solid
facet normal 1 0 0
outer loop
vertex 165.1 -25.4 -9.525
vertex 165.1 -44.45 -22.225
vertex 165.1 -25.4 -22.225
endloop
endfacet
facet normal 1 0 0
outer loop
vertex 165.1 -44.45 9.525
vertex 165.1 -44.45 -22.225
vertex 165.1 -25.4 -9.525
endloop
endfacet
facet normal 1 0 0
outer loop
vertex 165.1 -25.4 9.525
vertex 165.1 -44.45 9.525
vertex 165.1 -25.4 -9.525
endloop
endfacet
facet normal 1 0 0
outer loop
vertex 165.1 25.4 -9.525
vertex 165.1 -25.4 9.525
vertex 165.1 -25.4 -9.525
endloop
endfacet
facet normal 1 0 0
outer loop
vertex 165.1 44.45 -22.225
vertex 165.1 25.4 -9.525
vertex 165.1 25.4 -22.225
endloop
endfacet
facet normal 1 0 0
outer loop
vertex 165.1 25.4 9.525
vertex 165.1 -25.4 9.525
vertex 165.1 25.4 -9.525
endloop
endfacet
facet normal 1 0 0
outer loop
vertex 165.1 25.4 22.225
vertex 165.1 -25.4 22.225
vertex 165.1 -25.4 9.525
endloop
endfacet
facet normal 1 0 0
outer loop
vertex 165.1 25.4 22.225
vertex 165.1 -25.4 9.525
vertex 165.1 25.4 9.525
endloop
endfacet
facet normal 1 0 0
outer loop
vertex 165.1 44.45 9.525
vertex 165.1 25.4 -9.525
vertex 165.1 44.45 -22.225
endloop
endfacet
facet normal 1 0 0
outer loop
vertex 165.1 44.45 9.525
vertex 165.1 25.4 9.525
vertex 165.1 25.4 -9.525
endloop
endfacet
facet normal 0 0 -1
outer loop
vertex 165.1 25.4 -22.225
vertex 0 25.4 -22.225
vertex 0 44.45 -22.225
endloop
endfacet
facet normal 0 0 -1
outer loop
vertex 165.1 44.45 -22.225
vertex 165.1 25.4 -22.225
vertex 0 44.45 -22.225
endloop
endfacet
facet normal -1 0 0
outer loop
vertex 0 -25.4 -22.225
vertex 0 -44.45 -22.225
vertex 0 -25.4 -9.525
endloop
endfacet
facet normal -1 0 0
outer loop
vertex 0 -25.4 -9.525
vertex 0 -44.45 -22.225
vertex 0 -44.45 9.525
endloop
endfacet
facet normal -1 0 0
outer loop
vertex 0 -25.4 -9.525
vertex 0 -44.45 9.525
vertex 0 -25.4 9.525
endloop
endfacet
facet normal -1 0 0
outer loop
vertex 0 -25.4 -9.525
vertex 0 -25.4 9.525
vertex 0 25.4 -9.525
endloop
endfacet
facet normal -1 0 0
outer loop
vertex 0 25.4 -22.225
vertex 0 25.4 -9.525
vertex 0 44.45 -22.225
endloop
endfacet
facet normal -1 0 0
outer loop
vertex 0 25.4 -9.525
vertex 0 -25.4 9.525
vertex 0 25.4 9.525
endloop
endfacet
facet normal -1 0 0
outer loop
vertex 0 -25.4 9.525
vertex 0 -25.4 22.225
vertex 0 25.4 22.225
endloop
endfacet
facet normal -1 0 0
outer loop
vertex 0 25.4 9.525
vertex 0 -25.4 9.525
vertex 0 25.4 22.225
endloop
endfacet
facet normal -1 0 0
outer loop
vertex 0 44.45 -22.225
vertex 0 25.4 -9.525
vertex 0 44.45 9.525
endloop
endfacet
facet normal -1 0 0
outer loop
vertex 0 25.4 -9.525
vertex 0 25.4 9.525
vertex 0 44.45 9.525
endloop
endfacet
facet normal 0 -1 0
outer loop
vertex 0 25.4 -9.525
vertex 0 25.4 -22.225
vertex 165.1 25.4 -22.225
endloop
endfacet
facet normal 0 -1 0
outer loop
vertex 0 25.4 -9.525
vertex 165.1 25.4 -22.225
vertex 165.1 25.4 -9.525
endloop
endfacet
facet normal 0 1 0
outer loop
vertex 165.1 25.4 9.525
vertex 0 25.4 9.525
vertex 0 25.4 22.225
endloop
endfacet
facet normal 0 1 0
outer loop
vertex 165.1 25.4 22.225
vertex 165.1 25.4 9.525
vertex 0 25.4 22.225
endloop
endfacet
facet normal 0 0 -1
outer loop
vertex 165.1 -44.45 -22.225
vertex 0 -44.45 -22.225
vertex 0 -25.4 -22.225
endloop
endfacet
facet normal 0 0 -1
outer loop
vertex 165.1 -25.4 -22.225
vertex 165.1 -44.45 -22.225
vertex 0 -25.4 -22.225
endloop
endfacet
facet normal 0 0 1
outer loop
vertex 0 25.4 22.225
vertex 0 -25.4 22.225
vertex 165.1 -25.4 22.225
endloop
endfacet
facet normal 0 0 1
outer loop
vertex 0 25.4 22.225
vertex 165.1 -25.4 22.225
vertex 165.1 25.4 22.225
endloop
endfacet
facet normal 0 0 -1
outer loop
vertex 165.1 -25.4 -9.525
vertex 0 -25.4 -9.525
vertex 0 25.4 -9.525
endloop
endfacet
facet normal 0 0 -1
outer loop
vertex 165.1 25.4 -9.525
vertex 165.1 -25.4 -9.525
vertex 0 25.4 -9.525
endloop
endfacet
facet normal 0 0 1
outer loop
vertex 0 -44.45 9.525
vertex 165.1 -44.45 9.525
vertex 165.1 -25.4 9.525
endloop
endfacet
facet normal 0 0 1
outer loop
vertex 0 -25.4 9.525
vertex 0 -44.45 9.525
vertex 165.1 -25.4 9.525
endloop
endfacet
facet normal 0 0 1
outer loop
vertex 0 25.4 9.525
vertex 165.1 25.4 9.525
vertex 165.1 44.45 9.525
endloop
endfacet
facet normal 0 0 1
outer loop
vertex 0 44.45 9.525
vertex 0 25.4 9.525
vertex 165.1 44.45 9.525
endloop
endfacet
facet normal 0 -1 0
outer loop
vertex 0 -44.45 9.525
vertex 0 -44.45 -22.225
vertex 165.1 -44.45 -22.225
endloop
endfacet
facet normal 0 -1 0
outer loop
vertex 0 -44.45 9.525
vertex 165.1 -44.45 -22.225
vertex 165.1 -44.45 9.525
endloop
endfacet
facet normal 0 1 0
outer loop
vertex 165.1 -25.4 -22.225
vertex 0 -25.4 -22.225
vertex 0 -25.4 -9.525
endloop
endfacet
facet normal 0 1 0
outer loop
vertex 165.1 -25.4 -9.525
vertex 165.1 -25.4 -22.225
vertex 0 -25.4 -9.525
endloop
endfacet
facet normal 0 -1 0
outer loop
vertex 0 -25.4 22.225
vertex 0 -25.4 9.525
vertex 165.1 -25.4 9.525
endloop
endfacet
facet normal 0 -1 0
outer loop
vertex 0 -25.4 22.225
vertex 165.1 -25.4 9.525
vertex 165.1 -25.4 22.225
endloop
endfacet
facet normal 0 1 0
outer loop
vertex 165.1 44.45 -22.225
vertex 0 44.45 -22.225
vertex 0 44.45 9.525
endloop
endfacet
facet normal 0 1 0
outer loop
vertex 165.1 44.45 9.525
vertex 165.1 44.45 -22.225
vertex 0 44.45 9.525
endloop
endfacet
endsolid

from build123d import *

# Parameters (mm, degrees)
F0_W     = 88.9
F0_H     = 44.45
F1_DEPTH = 165.1
F2_W     = 19.05
F2_H     = 12.7
F2_W_2   = 50.8
F3_DEPTH = 165.1


with BuildPart() as f1:
    # F0 (on Right) → F1 (new body)
    with BuildSketch(Plane.YZ):
        Rectangle(F0_W, F0_H)
    extrude(amount=F1_DEPTH)

    # F2 (on face) → F3 (cut)
    with BuildSketch(Plane.YZ.offset(165.1)):
        with Locations((-34.925, 15.875)):
            Rectangle(F2_W, F2_H)
        with Locations((34.925, 15.875)):
            Rectangle(F2_W, F2_H)
        with Locations((0, -15.875)):
            Rectangle(F2_W_2, F2_H)
    extrude(amount=-F3_DEPTH, mode=Mode.SUBTRACT)


solid = f1.part
